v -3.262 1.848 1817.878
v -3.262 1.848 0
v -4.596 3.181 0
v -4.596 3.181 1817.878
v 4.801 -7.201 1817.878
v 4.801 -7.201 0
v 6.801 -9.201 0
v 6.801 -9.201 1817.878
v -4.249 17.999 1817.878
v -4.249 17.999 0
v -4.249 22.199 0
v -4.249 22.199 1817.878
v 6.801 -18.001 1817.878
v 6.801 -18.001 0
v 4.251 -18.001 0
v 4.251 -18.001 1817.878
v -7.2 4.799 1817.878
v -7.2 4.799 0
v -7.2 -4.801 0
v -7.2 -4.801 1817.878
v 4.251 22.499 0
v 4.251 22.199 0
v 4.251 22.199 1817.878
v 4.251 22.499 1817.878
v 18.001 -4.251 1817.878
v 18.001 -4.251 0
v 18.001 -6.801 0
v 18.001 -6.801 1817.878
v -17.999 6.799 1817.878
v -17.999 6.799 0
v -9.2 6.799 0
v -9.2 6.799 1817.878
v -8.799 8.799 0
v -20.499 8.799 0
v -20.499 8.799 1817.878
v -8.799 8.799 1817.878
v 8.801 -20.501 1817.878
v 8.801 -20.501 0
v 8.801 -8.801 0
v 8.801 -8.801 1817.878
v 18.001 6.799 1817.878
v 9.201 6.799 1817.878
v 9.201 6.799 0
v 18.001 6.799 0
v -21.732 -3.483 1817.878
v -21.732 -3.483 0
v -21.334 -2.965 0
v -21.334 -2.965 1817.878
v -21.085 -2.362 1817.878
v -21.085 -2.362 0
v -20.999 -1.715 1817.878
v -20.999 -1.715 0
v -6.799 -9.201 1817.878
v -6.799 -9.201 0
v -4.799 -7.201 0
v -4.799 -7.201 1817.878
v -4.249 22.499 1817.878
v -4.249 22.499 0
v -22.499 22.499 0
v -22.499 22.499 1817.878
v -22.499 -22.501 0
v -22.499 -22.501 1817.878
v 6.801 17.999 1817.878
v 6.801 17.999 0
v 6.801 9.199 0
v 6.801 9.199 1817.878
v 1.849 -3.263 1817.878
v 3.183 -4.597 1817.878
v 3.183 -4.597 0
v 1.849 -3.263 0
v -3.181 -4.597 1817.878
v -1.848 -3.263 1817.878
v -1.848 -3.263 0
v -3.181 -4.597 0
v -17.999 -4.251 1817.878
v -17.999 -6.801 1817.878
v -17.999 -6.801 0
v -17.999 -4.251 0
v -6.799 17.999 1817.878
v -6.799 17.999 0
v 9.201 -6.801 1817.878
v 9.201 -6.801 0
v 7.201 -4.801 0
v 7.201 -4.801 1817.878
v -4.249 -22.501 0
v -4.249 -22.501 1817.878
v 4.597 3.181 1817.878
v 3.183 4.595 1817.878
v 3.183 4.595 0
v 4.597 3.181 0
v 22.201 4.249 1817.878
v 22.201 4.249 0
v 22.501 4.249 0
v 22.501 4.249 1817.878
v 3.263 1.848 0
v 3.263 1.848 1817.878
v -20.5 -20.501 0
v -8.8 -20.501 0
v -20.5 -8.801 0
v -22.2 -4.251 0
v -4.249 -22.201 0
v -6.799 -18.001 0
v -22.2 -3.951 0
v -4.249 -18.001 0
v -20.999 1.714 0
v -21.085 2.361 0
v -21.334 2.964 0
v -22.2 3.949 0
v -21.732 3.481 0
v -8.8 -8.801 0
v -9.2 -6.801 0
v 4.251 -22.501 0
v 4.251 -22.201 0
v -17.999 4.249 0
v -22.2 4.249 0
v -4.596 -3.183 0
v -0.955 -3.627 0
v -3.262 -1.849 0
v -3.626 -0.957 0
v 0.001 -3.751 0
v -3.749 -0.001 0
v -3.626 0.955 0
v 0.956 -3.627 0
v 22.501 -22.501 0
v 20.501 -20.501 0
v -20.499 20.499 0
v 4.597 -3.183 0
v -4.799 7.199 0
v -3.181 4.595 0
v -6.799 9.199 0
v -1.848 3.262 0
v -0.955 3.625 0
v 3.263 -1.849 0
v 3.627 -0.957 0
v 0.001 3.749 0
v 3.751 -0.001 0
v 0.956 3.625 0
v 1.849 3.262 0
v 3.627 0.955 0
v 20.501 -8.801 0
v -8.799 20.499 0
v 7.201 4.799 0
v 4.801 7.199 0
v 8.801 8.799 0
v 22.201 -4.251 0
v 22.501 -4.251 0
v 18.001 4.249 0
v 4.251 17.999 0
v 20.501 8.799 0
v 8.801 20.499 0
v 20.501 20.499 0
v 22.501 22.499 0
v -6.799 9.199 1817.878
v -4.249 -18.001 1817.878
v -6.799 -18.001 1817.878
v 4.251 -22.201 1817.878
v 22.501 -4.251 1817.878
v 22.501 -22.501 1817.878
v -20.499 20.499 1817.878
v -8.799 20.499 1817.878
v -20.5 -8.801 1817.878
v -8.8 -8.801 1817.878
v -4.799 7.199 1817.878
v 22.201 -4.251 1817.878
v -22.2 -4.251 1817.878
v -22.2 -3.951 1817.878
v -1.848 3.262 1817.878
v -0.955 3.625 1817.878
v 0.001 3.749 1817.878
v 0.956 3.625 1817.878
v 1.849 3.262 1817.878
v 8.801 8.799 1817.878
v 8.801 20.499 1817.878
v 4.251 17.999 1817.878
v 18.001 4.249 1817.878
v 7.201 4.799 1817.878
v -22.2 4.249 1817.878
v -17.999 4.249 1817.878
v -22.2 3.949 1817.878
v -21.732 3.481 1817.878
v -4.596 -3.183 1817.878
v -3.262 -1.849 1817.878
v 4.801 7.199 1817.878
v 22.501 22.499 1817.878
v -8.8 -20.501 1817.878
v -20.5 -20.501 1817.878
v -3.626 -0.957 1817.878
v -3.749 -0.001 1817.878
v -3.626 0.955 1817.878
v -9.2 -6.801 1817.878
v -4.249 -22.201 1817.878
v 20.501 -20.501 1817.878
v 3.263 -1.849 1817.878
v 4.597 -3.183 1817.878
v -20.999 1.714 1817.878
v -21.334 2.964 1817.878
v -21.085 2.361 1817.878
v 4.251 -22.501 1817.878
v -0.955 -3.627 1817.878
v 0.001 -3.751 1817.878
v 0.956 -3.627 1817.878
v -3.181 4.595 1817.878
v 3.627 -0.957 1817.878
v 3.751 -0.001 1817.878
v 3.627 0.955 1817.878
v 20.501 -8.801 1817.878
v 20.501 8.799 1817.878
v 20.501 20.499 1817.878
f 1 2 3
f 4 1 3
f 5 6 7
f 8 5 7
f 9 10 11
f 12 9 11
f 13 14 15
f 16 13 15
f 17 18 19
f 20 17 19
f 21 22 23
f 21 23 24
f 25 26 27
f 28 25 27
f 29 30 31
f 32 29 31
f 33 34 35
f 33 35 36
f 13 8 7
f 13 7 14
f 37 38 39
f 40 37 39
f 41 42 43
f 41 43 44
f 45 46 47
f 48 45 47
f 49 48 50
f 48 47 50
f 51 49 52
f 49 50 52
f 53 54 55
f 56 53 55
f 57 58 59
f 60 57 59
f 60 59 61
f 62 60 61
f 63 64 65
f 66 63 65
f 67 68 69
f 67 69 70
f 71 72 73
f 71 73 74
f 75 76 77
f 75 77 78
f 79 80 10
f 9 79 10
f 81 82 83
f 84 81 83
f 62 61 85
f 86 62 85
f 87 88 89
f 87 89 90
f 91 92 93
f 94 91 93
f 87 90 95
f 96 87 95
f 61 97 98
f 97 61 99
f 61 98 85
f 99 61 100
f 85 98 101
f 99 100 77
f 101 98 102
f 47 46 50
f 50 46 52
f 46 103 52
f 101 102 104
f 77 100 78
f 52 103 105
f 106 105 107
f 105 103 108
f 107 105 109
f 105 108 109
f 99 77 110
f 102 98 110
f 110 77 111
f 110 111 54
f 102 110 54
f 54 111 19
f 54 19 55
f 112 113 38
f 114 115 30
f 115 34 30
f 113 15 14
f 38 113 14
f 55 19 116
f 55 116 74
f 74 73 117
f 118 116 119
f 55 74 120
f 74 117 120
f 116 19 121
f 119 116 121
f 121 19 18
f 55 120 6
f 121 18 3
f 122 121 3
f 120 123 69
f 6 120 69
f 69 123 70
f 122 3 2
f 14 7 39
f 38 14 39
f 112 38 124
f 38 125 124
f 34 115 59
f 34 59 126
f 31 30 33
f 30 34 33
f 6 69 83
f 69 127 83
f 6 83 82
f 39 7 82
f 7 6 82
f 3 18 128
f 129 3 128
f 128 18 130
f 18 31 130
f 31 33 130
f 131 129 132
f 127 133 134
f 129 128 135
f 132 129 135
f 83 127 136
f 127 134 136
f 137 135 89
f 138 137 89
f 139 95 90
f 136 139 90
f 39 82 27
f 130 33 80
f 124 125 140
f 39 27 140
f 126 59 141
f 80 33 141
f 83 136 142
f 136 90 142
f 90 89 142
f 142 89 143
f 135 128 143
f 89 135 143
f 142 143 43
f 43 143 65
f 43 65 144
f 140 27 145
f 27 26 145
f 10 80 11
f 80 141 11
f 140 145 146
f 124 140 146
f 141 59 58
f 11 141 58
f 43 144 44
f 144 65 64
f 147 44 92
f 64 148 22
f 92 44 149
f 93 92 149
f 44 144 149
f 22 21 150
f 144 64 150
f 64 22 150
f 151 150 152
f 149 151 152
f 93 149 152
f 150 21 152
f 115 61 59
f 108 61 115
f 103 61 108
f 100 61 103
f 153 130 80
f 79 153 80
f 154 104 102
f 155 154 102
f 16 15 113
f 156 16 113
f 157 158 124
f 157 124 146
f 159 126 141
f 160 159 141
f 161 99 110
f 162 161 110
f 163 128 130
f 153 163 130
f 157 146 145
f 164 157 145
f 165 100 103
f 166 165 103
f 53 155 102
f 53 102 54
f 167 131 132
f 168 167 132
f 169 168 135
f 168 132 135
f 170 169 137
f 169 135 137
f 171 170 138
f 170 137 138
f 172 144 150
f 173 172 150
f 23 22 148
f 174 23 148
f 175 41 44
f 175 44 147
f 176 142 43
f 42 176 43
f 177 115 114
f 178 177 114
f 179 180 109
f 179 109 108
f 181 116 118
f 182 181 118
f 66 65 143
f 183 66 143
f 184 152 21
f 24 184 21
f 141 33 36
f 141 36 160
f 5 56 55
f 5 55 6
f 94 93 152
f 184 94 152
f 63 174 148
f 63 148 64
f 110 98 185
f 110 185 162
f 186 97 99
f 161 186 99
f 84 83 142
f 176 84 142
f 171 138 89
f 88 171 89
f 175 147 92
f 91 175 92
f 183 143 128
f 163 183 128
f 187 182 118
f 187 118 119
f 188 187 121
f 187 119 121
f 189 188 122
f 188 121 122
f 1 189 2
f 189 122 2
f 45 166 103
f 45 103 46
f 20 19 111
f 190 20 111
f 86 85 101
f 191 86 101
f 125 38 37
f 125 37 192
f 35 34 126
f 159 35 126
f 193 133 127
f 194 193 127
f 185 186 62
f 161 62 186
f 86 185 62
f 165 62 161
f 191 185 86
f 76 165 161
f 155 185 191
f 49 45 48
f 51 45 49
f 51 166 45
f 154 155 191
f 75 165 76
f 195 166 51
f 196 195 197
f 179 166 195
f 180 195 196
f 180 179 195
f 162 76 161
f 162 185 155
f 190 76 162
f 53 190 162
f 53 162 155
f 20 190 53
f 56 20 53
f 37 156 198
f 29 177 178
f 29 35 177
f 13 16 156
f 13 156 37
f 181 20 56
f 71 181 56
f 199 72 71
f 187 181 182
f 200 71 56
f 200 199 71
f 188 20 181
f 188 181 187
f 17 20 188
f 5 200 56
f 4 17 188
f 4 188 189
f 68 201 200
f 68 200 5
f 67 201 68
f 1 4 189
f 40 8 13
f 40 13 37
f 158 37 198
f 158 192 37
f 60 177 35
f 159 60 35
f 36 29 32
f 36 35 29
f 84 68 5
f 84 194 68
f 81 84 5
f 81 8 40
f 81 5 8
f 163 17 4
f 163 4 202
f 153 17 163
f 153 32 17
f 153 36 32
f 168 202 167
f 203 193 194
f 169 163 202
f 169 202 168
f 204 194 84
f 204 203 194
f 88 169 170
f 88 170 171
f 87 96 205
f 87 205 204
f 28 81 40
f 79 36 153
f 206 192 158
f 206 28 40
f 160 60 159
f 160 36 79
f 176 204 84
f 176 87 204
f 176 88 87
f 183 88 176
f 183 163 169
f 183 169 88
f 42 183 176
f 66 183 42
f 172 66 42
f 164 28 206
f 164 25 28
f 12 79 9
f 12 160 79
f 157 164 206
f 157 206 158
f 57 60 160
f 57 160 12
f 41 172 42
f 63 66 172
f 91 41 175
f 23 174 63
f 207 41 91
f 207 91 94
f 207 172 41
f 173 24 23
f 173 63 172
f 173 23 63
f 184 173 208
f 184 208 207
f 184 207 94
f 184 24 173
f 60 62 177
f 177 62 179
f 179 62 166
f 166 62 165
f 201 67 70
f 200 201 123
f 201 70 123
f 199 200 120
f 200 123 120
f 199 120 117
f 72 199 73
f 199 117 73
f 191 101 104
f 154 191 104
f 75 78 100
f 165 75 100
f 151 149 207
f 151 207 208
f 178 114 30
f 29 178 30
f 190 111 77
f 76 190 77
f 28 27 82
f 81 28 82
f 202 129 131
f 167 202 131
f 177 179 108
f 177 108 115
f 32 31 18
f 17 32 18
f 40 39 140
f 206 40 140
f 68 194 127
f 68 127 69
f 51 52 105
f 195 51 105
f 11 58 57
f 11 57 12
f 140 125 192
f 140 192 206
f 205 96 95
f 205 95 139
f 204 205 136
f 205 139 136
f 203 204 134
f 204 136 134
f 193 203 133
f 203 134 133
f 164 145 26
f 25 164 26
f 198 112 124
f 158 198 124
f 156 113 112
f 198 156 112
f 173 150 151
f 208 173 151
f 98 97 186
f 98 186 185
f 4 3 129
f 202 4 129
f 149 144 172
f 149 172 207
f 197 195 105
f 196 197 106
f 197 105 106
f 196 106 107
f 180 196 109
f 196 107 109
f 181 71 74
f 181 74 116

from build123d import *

# Parameters (mm, degrees)
SKETCH1_W           = 11.699975178
SKETCH1_H           = 11.699996949
SKETCH1_W_2         = 11.699990436
SKETCH1_H_2         = 11.699981689
SKETCH1_W_3         = 11.699990437
SKETCH1_H_3         = 11.699975177
SKETCH1_W_4         = 11.699981689
SKETCH1_H_4         = 11.699990436
BOSS_EXTRUDE1_DEPTH = 1817.878
CUT_EXTRUDE1_REACH  = 1820.156


with BuildPart() as part:
    # Sketch1 → Boss-Extrude1 (new body)
    with BuildSketch(Plane.XY):
        Polygon((22.500515052, 22.499297556), (-22.499484399, 22.499298105), (-22.499484948, -22.500701346), (-4.249491942, -22.500701568), (-4.249491942, -22.200733242), (-4.24949208, -18.000719999), (-6.799479919, -18.000719999), (-6.799480207, -9.200732353), (-4.799480391, -7.200732362), (4.800525817, -7.200732047), (6.8005258, -9.200731855), (6.800526088, -18.000720263), (4.250507877, -18.000720263), (4.250508015, -22.200733153), (4.250508015, -22.500701672), (22.500514502, -22.500701895), (22.500514725, -4.250714302), (22.200520351, -4.250714302), (18.000507108, -4.25071444), (18.000507108, -6.800702279), (9.200519462, -6.800702567), (7.200519471, -4.800702751), (7.200519156, 4.799303458), (9.200518964, 6.79930344), (18.000507424, 6.799303729), (18.000507424, 4.249285514), (22.200520261, 4.249285652), (22.500514829, 4.249285652), align=None)
        with BuildLine():
            Line((-4.249491247, 17.999291576), (-4.249490956, 22.199304807))
            Line((-4.249490956, 22.199304807), (-3.949472548, 22.199304807))
            Line((-3.949472548, 22.199304807), (-3.481695222, 21.73152644))
            ThreePointArc((-3.481695222, 21.73152644), (-2.670636178, 21.189593132), (-1.713926324, 20.999291428))
            Line((-1.713926324, 20.999291428), (1.714975167, 20.999291428))
            ThreePointArc((1.714975167, 20.999291428), (2.671722509, 21.189608628), (3.482801459, 21.731583767))
            Line((3.482801459, 21.731583767), (3.950490798, 22.199304487))
            Line((3.950490798, 22.199304487), (4.250509108, 22.199304487))
            Line((4.250509108, 22.199304487), (4.250508817, 17.999291575))
            Line((4.250508817, 17.999291575), (6.800527063, 17.999291575))
            Line((6.800527063, 17.999291575), (6.800526453, 9.199302988))
            Line((6.800526453, 9.199302988), (4.800526064, 7.199302969))
            Line((4.800526064, 7.199302969), (-4.799479817, 7.199303635))
            Line((-4.799479817, 7.199303635), (-6.799479854, 9.199304042))
            Line((-6.799479854, 9.199304042), (-6.799479244, 17.999291576))
            Line((-6.799479244, 17.999291576), (-4.249491247, 17.999291576))
        make_face(mode=Mode.SUBTRACT)
        with BuildLine():
            Line((-17.99949762, -4.250714253), (-22.199510799, -4.250714391))
            Line((-22.199510799, -4.250714391), (-22.199510799, -3.950696126))
            Line((-22.199510799, -3.950696126), (-21.731790056, -3.48300681))
            ThreePointArc((-21.731790056, -3.48300681), (-21.189814855, -2.671927844), (-20.999497617, -1.71518046))
            Line((-20.999497617, -1.71518046), (-20.999497617, 1.713721031))
            ThreePointArc((-20.999497617, 1.713721031), (-21.189799286, 2.670430863), (-21.731732544, 3.481489907))
            Line((-21.731732544, 3.481489907), (-22.199510888, 3.949267256))
            Line((-22.199510888, 3.949267256), (-22.199510888, 4.249285566))
            Line((-22.199510888, 4.249285566), (-17.999497356, 4.249285704))
            Line((-17.999497356, 4.249285704), (-17.999497356, 6.79927354))
            Line((-17.999497356, 6.79927354), (-9.199509947, 6.799273828))
            Line((-9.199509947, 6.799273828), (-7.199509956, 4.799274012))
            Line((-7.199509956, 4.799274012), (-7.199509641, -4.800732197))
            Line((-7.199509641, -4.800732197), (-9.199509449, -6.800732179))
            Line((-9.199509449, -6.800732179), (-17.99949762, -6.800732468))
            Line((-17.99949762, -6.800732468), (-17.99949762, -4.250714253))
        make_face(mode=Mode.SUBTRACT)
        with Locations((-14.649542346, -14.650709384)):
            Rectangle(SKETCH1_W, SKETCH1_H, mode=Mode.SUBTRACT)
        with Locations((14.65050626, -14.650767962)):
            Rectangle(SKETCH1_W_2, SKETCH1_H_2, mode=Mode.SUBTRACT)
        with BuildLine():
            Line((-3.181457266, -4.596908447), (-4.595670829, -3.182694885))
            Line((-4.595670829, -3.182694885), (-3.26221457, -1.849238626))
            ThreePointArc((-3.26221457, -1.849238626), (-3.749476751, -0.00071437), (-3.26221457, 1.847809887))
            Line((-3.26221457, 1.847809887), (-4.595670829, 3.181266146))
            Line((-4.595670829, 3.181266146), (-3.181457266, 4.595479708))
            Line((-3.181457266, 4.595479708), (-1.848001007, 3.262023449))
            ThreePointArc((-1.848001007, 3.262023449), (0.000523249, 3.74928563), (1.849047505, 3.262023449))
            Line((1.849047505, 3.262023449), (3.182503764, 4.595479708))
            Line((3.182503764, 4.595479708), (4.596717327, 3.181266146))
            Line((4.596717327, 3.181266146), (3.263261068, 1.847809887))
            ThreePointArc((3.263261068, 1.847809887), (3.750523249, -0.00071437), (3.263261068, -1.849238626))
            Line((3.263261068, -1.849238626), (4.596717327, -3.182694885))
            Line((4.596717327, -3.182694885), (3.182503764, -4.596908447))
            Line((3.182503764, -4.596908447), (1.849047505, -3.263452188))
            ThreePointArc((1.849047505, -3.263452188), (0.000523249, -3.75071437), (-1.848001007, -3.263452188))
            Line((-1.848001007, -3.263452188), (-3.181457266, -4.596908447))
        make_face(mode=Mode.SUBTRACT)
        with Locations((-14.64949028, 14.649335967)):
            Rectangle(SKETCH1_W_3, SKETCH1_H_3, mode=Mode.SUBTRACT)
        with Locations((14.650561583, 14.6492839)):
            Rectangle(SKETCH1_W_4, SKETCH1_H_4, mode=Mode.SUBTRACT)
    extrude(amount=BOSS_EXTRUDE1_DEPTH)

    # Sketch1<4> → Cut-Extrude1 (cut, up to next)
    with BuildSketch(Plane.XY, mode=Mode.PRIVATE) as cut_extrude1_sk1:
        with BuildLine():
            Line((-4.249490956, 22.499297883), (-4.249490956, 22.199304807))
            Line((-4.249490956, 22.199304807), (-3.949472548, 22.199304807))
            Line((-3.949472548, 22.199304807), (-3.481695222, 21.73152644))
            ThreePointArc((-3.481695222, 21.73152644), (-2.670636178, 21.189593132), (-1.713926324, 20.999291428))
            Line((-1.713926324, 20.999291428), (1.714975167, 20.999291428))
            ThreePointArc((1.714975167, 20.999291428), (2.671722509, 21.189608628), (3.482801459, 21.731583767))
            Line((3.482801459, 21.731583767), (3.950490798, 22.199304487))
            Line((3.950490798, 22.199304487), (4.250509108, 22.199304487))
            Line((4.250509108, 22.199304487), (4.250509108, 22.499297779))
            Line((4.250509108, 22.499297779), (-4.249490956, 22.499297883))
        make_face()
    cut_extrude1_tool1 = extrude(cut_extrude1_sk1.sketch, amount=CUT_EXTRUDE1_REACH, mode=Mode.PRIVATE) & part.part
    add(cut_extrude1_tool1.solids().sort_by_distance((0.000518, 21.824215, 0))[0], mode=Mode.SUBTRACT)


solid = part.part
